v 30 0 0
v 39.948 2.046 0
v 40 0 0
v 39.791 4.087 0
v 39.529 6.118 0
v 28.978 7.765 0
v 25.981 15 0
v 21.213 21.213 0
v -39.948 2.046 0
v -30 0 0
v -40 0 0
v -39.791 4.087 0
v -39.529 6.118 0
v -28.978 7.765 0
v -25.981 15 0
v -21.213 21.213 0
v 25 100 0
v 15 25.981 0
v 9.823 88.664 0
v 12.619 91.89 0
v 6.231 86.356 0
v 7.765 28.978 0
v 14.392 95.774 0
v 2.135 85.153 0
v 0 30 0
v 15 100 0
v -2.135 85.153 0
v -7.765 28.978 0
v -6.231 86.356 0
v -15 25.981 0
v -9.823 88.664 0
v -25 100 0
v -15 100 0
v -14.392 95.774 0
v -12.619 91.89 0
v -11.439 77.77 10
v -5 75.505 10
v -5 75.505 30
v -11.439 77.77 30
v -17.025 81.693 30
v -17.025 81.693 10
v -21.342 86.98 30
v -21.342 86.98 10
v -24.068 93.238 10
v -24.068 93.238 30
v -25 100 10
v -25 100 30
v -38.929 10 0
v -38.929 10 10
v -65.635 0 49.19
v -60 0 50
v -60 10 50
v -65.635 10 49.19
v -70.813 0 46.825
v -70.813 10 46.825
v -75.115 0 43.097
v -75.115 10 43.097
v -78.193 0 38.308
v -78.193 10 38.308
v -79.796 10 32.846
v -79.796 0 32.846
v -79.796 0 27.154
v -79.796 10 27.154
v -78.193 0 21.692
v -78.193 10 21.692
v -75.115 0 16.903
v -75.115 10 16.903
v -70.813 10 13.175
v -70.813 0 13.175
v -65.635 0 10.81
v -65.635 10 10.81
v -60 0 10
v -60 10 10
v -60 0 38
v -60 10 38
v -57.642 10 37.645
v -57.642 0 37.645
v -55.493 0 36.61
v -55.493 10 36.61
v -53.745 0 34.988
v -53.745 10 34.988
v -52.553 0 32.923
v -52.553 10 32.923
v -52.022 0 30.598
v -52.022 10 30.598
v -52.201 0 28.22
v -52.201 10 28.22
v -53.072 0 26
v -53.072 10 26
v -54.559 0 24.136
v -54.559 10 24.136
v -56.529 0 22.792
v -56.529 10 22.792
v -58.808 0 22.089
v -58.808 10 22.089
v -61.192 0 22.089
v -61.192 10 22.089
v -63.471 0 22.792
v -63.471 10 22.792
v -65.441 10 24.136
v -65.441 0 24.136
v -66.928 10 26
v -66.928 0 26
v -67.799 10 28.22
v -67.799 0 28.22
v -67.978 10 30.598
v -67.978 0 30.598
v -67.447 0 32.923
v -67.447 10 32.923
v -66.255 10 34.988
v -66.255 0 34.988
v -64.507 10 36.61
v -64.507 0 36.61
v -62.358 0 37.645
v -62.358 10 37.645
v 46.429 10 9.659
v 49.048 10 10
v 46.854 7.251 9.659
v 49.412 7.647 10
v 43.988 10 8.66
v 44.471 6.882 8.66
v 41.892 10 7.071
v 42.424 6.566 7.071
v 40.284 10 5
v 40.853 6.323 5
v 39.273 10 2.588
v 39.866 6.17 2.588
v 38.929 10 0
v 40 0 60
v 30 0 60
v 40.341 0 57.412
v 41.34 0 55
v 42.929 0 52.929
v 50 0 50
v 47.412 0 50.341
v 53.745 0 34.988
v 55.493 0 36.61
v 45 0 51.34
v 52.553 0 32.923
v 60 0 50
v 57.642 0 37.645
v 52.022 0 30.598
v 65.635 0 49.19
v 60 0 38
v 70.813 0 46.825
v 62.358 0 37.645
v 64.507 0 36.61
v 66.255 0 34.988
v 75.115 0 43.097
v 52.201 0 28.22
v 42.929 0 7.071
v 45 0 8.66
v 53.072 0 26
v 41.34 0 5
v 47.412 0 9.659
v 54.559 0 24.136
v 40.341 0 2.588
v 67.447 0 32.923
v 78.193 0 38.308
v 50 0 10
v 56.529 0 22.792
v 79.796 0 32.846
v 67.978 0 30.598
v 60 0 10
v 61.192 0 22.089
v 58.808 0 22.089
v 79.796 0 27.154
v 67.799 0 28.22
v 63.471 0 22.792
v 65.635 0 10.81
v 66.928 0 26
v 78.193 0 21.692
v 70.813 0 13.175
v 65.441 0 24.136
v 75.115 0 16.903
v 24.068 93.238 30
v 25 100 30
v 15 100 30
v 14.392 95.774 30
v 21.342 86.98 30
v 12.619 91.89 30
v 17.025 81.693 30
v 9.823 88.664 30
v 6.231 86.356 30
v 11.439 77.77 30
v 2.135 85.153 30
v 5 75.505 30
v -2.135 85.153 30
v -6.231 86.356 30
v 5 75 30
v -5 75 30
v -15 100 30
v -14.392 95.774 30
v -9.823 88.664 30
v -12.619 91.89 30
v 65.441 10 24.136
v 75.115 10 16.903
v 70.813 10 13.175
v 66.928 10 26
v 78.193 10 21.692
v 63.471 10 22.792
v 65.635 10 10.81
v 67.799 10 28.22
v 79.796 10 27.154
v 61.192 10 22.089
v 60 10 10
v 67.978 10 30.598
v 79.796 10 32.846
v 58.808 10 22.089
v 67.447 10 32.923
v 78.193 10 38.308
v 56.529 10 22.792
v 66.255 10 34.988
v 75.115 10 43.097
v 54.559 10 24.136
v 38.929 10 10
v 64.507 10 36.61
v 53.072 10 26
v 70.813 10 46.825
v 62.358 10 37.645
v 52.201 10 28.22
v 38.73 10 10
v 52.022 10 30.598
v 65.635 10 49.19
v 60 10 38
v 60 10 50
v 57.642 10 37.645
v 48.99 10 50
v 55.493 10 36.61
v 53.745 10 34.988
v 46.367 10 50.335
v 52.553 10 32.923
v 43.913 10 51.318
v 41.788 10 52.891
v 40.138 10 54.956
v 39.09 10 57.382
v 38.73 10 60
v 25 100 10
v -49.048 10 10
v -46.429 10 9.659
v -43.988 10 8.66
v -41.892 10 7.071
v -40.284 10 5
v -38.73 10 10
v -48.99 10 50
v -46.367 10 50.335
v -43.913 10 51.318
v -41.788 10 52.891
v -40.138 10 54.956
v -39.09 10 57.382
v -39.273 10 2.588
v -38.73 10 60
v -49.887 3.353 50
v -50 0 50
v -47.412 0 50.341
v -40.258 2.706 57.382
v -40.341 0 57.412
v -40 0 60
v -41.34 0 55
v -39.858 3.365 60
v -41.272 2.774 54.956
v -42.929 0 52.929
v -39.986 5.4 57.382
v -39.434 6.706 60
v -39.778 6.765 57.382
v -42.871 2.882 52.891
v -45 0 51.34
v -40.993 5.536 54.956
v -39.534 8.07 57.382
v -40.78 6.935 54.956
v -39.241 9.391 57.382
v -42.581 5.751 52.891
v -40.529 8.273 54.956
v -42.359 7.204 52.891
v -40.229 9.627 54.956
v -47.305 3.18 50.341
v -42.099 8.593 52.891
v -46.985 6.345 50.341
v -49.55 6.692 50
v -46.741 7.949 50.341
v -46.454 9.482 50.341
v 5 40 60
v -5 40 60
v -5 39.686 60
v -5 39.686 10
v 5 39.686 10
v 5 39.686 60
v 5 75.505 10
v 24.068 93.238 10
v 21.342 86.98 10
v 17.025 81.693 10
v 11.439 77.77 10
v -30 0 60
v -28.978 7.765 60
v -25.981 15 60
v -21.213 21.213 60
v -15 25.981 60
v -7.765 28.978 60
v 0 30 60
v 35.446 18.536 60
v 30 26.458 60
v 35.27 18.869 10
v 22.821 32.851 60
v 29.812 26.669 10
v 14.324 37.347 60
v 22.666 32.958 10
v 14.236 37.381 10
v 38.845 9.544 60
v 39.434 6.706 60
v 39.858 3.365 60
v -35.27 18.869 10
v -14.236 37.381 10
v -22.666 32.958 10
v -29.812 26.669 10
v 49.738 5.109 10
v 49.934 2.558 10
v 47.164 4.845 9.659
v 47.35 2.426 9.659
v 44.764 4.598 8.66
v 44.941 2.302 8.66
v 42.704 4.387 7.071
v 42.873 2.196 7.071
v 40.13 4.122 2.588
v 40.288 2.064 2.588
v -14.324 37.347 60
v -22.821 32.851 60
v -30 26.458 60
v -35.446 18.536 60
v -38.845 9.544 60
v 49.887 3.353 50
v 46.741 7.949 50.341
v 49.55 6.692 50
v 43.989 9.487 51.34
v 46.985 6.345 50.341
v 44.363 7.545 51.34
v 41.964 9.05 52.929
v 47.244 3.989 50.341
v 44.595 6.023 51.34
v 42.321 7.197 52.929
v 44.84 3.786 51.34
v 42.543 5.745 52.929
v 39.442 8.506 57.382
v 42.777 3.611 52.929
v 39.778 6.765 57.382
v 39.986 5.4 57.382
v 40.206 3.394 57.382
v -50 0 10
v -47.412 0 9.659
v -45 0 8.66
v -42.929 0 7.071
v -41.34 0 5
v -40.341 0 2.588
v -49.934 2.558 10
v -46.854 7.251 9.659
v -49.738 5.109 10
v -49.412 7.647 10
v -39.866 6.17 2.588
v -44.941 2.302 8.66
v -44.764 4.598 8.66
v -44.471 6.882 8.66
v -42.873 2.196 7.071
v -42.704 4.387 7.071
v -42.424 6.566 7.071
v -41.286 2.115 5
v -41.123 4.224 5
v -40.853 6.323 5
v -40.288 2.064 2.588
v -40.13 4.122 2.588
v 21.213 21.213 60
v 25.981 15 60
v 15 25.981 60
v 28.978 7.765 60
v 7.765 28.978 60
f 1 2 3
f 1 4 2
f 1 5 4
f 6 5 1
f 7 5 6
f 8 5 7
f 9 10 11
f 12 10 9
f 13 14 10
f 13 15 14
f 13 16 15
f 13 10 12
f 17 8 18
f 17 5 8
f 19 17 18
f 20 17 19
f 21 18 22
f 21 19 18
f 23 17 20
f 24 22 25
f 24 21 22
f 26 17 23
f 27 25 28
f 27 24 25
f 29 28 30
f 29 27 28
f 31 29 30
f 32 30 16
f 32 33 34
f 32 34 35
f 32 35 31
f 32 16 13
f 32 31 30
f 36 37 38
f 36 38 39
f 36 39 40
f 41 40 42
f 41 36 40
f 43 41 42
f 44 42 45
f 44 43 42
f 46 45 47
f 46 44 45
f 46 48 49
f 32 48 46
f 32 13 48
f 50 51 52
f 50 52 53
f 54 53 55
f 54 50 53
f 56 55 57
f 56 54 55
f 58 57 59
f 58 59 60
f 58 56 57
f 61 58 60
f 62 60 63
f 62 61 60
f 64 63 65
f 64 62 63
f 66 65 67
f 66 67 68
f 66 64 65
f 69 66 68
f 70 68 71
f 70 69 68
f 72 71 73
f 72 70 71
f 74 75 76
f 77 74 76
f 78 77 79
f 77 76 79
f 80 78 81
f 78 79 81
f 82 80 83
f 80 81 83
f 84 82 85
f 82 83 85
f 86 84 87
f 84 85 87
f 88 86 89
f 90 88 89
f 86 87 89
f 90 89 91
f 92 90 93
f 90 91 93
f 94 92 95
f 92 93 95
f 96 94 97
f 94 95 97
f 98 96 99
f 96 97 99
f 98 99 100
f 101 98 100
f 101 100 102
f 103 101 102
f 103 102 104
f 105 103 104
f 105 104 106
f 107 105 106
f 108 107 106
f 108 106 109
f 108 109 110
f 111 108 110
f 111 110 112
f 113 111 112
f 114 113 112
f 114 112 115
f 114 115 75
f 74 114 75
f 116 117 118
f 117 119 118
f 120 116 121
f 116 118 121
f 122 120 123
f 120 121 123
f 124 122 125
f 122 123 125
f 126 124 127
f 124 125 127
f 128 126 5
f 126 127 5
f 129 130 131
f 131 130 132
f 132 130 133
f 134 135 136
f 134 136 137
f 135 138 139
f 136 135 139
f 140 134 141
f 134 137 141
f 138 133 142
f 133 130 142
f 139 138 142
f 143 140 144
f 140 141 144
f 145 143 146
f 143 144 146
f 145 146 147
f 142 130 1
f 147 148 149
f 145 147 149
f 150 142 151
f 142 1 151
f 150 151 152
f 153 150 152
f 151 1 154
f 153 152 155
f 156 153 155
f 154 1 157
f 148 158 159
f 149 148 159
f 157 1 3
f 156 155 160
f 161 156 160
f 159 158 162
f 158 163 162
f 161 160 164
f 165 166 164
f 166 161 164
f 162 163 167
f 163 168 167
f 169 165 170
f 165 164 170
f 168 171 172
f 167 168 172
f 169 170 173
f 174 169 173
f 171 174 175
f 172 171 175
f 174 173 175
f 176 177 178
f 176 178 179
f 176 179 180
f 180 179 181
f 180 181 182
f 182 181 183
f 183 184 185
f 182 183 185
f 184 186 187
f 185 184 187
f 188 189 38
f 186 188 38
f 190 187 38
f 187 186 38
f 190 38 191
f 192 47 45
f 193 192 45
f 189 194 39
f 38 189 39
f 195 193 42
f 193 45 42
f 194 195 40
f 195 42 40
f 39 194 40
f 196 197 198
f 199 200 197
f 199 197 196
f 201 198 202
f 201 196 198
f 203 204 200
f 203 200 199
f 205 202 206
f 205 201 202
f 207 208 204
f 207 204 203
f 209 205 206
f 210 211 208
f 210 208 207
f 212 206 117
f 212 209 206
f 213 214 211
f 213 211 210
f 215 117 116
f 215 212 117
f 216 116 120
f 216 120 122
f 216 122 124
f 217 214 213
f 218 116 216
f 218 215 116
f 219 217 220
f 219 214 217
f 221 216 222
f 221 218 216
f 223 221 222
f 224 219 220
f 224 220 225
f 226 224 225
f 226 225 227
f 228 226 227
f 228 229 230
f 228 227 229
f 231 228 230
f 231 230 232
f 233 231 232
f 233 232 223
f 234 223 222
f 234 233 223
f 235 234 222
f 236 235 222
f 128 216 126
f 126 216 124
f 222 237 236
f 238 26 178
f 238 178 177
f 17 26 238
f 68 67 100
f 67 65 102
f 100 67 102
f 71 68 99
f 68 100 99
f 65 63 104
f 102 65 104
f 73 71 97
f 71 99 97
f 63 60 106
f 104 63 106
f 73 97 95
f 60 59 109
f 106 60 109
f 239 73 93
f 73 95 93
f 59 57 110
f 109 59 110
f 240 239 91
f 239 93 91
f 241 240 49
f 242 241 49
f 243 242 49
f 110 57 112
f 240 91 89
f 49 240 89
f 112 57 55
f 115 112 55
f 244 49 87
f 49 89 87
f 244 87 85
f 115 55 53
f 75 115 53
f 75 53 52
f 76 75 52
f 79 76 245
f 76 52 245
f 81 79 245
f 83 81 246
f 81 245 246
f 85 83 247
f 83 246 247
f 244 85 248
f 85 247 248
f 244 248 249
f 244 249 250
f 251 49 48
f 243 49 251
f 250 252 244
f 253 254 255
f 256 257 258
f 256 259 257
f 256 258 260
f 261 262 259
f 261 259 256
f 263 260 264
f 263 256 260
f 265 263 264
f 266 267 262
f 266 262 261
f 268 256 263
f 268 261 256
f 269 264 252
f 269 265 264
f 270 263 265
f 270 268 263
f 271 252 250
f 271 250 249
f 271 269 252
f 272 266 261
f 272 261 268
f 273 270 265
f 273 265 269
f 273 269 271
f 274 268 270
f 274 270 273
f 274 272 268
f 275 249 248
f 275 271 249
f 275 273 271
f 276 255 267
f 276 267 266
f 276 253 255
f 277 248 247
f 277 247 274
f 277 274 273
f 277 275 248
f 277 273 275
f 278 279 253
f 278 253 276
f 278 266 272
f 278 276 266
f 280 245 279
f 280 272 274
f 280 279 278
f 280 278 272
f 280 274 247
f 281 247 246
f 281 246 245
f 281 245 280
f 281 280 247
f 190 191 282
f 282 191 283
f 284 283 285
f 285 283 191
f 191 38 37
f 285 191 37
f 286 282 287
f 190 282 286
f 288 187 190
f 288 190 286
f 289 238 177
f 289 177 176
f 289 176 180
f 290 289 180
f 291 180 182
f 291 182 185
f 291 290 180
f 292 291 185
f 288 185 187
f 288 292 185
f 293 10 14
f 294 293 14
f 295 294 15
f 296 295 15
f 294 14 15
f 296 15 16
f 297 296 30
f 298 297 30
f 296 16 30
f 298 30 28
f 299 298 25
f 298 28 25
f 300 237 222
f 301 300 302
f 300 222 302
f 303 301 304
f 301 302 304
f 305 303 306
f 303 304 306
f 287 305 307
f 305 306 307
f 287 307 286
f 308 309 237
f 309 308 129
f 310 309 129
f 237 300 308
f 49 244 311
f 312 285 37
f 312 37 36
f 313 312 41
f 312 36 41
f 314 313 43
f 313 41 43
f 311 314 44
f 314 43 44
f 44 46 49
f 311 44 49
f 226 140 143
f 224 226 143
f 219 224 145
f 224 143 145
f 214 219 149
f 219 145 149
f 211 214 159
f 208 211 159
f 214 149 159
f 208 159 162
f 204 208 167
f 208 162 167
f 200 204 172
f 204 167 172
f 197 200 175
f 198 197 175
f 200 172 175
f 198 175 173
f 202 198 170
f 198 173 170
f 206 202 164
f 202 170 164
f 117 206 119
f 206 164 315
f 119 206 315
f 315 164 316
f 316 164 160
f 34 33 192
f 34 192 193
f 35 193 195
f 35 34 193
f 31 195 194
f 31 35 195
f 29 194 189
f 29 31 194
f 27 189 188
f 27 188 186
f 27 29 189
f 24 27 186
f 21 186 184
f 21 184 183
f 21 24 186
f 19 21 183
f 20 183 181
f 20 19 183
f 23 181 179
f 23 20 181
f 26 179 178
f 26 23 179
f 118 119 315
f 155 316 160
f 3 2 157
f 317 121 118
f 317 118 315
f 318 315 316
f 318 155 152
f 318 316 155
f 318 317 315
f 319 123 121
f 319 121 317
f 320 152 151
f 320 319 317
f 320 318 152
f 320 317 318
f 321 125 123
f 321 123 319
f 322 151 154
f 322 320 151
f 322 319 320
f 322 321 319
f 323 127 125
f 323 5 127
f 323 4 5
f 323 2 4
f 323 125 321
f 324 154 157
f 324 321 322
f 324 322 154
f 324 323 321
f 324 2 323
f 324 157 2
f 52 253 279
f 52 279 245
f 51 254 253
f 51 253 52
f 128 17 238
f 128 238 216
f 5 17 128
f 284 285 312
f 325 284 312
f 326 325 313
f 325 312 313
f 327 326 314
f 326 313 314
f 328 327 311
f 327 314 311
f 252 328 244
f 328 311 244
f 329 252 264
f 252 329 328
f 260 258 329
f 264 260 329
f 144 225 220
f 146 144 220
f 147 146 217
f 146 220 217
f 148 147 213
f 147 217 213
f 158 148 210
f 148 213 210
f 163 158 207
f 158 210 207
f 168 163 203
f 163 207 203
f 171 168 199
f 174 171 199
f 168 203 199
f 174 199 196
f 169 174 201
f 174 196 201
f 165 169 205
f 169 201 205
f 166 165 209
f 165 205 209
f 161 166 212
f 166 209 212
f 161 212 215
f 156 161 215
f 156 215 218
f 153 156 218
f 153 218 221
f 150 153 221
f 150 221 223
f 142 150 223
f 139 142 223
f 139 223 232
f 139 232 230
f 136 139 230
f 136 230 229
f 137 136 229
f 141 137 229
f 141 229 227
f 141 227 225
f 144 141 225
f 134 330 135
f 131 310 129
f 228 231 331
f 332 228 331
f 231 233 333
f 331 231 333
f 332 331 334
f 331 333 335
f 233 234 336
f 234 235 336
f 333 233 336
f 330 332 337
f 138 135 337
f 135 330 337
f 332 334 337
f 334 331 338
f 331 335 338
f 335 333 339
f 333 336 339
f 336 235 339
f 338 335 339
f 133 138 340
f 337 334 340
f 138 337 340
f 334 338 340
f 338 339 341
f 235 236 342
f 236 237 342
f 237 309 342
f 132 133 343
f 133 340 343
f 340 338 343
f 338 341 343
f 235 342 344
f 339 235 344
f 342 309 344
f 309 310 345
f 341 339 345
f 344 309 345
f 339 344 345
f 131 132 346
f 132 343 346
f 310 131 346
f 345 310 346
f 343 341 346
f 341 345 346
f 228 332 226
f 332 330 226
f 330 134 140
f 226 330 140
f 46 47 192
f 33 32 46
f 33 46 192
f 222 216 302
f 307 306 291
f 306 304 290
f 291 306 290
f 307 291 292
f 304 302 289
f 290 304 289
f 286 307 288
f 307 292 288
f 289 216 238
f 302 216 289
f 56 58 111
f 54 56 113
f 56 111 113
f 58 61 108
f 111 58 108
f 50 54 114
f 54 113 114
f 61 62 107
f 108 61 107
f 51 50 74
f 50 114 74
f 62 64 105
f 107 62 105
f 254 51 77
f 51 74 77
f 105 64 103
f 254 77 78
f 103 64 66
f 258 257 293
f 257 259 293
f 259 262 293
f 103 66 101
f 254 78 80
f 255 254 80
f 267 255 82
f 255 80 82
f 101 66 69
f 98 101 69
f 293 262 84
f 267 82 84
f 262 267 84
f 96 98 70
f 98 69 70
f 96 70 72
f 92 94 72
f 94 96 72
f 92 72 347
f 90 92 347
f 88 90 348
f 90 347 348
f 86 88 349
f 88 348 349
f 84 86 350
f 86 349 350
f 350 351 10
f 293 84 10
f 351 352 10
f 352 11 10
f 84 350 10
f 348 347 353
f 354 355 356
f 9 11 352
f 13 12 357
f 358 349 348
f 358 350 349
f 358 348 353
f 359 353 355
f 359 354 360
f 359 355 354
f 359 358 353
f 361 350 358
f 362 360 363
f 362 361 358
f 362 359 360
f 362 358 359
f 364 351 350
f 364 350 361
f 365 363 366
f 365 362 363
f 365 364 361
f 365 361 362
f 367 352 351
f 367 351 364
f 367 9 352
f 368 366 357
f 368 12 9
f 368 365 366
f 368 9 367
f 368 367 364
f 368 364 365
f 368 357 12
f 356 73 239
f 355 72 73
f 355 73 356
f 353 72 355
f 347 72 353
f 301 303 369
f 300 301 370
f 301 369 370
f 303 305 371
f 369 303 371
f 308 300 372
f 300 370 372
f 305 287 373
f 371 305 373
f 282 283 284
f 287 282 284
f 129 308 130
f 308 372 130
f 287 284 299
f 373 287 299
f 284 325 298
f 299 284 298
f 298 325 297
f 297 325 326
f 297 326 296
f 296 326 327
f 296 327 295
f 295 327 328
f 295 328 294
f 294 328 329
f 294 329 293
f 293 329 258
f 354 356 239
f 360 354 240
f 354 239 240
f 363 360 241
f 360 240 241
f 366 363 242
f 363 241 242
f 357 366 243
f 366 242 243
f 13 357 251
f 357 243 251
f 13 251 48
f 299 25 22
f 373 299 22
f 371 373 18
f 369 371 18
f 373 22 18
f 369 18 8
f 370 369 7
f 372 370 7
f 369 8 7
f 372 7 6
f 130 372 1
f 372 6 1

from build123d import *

# Parameters (mm, degrees)
BOSS_EXTRUDE1_DEPTH  = 60
BOSS_EXTRUDE2_DEPTH  = 30
BOSS_EXTRUDE3_DEPTH  = 10
BOSS_EXTRUDE4_DEPTH  = 10
FILLET1_R            = 10
FILLET1_OF_MIRROR2_R = 10
SKETCH13_R           = 8
CUT_EXTRUDE1_DEPTH   = 135.53624053
RIB1_START           = -5
RIB1_DEPTH           = 10


with BuildPart() as part:
    # Sketch2 → Boss-Extrude1 (new body)
    with BuildSketch(Plane.XY):
        with BuildLine():
            ThreePointArc((-30, 0), (-21.213203436, 21.213203436), (0, 30))
            Line((0, 30), (0, 40))
            ThreePointArc((0, 40), (-28.284271247, 28.284271247), (-40, 0))
            Line((-40, 0), (-30, 0))
        make_face()
        with BuildLine():
            Line((0, 40), (0, 30))
            ThreePointArc((0, 30), (21.213203436, 21.213203436), (30, 0))
            Line((30, 0), (40, 0))
            ThreePointArc((40, 0), (28.284271247, 28.284271247), (0, 40))
        make_face()
    extrude(amount=BOSS_EXTRUDE1_DEPTH)



with BuildPart() as body_2:
    # Sketch2<3> → Boss-Extrude2 (new body)
    with BuildSketch(Plane.XY):
        with BuildLine():
            Line((-25, 100), (-15, 100))
            ThreePointArc((-15, 100), (0, 85), (15, 100))
            Line((15, 100), (25, 100))
            ThreePointArc((25, 100), (0, 75), (-25, 100))
        make_face()
    extrude(amount=BOSS_EXTRUDE2_DEPTH)


with BuildPart() as part_1:
    add(part.part)

    add(body_2.part)  # Boss-Extrude3 merges body 2
    # Sketch8 → Boss-Extrude3 (add)
    with BuildSketch(Plane(origin=(0, 0, 0), x_dir=(-1, 0, 0), z_dir=(0, 0, -1))):
        with BuildLine():
            Line((-25, 100), (-39.529411765, 6.117647059))
            ThreePointArc((-39.529411765, 6.117647059), (0, 40), (39.529411765, 6.117647059))
            Line((39.529411765, 6.117647059), (25, 100))
            ThreePointArc((25, 100), (0, 75), (-25, 100))
        make_face()
    extrude(amount=-BOSS_EXTRUDE3_DEPTH)

    # Sketch10 → Boss-Extrude4 (add)
    with BuildSketch(Plane.XZ):
        with BuildLine():
            Line((35, 50), (60, 50))
            ThreePointArc((60, 50), (80, 30), (60, 10))
            Line((60, 10), (35, 10))
            Line((35, 10), (35, 50))
        make_face()
    boss_extrude4 = extrude(amount=-BOSS_EXTRUDE4_DEPTH)

    # Fillet1
    fillet1_edges = [part_1.edges().sort_by_distance(p)[0] for p in [
        (39.228991597, 8.058823529, 10),
        (39.88217942, 3.067859955, 10),
        (39.681187851, 5.040171699, 50),
    ]]
    fillet(fillet1_edges, radius=FILLET1_R - 0.0001)  # a hair under: the kernel refuses the full size

    # Mirror2: Boss-Extrude4 across plane
    add(boss_extrude4.mirror(Plane(origin=(0, 0, 0), x_dir=(0, 0, 1), z_dir=(1, 0, 0))))

    # Fillet1 of Mirror2
    fillet1_of_mirror2_edges = [part_1.edges().sort_by_distance(p)[0] for p in [
        (-39.228991597, 8.058823529, 10),
        (-39.88217942, 3.067859955, 10),
        (-39.681187851, 5.040171699, 50),
    ]]
    fillet(fillet1_of_mirror2_edges, radius=FILLET1_OF_MIRROR2_R - 0.0001)  # a hair under: the kernel refuses the full size

    # Sketch13 → Cut-Extrude1 (cut, through all)
    with BuildSketch(Plane(origin=(0, 10, 0), x_dir=(1, 0, 0), z_dir=(0, 1, 0))):
        with Locations(Location((60, -30, 0), (0, 0, 270))):
            Circle(SKETCH13_R)
        with Locations(Location((-60, -30, 0), (0, 0, 270))):
            Circle(SKETCH13_R)
    extrude(amount=-CUT_EXTRUDE1_DEPTH, mode=Mode.SUBTRACT)

    # Rib1: read off the stored shape, not the designer's step
    # Rib1 outline → Rib1 (add)
    with BuildSketch(Plane(origin=(0, 0, 0), x_dir=(0, 0, -1), z_dir=(1, 0, 0)).offset(RIB1_START)):
        Polygon((-60, 40), (-60, 39.686269666), (-10, 39.686269666), (-10, 75.505102572), (-30, 75.505102572), (-30, 75), align=None)
    extrude(amount=RIB1_DEPTH)


solid = part_1.part
